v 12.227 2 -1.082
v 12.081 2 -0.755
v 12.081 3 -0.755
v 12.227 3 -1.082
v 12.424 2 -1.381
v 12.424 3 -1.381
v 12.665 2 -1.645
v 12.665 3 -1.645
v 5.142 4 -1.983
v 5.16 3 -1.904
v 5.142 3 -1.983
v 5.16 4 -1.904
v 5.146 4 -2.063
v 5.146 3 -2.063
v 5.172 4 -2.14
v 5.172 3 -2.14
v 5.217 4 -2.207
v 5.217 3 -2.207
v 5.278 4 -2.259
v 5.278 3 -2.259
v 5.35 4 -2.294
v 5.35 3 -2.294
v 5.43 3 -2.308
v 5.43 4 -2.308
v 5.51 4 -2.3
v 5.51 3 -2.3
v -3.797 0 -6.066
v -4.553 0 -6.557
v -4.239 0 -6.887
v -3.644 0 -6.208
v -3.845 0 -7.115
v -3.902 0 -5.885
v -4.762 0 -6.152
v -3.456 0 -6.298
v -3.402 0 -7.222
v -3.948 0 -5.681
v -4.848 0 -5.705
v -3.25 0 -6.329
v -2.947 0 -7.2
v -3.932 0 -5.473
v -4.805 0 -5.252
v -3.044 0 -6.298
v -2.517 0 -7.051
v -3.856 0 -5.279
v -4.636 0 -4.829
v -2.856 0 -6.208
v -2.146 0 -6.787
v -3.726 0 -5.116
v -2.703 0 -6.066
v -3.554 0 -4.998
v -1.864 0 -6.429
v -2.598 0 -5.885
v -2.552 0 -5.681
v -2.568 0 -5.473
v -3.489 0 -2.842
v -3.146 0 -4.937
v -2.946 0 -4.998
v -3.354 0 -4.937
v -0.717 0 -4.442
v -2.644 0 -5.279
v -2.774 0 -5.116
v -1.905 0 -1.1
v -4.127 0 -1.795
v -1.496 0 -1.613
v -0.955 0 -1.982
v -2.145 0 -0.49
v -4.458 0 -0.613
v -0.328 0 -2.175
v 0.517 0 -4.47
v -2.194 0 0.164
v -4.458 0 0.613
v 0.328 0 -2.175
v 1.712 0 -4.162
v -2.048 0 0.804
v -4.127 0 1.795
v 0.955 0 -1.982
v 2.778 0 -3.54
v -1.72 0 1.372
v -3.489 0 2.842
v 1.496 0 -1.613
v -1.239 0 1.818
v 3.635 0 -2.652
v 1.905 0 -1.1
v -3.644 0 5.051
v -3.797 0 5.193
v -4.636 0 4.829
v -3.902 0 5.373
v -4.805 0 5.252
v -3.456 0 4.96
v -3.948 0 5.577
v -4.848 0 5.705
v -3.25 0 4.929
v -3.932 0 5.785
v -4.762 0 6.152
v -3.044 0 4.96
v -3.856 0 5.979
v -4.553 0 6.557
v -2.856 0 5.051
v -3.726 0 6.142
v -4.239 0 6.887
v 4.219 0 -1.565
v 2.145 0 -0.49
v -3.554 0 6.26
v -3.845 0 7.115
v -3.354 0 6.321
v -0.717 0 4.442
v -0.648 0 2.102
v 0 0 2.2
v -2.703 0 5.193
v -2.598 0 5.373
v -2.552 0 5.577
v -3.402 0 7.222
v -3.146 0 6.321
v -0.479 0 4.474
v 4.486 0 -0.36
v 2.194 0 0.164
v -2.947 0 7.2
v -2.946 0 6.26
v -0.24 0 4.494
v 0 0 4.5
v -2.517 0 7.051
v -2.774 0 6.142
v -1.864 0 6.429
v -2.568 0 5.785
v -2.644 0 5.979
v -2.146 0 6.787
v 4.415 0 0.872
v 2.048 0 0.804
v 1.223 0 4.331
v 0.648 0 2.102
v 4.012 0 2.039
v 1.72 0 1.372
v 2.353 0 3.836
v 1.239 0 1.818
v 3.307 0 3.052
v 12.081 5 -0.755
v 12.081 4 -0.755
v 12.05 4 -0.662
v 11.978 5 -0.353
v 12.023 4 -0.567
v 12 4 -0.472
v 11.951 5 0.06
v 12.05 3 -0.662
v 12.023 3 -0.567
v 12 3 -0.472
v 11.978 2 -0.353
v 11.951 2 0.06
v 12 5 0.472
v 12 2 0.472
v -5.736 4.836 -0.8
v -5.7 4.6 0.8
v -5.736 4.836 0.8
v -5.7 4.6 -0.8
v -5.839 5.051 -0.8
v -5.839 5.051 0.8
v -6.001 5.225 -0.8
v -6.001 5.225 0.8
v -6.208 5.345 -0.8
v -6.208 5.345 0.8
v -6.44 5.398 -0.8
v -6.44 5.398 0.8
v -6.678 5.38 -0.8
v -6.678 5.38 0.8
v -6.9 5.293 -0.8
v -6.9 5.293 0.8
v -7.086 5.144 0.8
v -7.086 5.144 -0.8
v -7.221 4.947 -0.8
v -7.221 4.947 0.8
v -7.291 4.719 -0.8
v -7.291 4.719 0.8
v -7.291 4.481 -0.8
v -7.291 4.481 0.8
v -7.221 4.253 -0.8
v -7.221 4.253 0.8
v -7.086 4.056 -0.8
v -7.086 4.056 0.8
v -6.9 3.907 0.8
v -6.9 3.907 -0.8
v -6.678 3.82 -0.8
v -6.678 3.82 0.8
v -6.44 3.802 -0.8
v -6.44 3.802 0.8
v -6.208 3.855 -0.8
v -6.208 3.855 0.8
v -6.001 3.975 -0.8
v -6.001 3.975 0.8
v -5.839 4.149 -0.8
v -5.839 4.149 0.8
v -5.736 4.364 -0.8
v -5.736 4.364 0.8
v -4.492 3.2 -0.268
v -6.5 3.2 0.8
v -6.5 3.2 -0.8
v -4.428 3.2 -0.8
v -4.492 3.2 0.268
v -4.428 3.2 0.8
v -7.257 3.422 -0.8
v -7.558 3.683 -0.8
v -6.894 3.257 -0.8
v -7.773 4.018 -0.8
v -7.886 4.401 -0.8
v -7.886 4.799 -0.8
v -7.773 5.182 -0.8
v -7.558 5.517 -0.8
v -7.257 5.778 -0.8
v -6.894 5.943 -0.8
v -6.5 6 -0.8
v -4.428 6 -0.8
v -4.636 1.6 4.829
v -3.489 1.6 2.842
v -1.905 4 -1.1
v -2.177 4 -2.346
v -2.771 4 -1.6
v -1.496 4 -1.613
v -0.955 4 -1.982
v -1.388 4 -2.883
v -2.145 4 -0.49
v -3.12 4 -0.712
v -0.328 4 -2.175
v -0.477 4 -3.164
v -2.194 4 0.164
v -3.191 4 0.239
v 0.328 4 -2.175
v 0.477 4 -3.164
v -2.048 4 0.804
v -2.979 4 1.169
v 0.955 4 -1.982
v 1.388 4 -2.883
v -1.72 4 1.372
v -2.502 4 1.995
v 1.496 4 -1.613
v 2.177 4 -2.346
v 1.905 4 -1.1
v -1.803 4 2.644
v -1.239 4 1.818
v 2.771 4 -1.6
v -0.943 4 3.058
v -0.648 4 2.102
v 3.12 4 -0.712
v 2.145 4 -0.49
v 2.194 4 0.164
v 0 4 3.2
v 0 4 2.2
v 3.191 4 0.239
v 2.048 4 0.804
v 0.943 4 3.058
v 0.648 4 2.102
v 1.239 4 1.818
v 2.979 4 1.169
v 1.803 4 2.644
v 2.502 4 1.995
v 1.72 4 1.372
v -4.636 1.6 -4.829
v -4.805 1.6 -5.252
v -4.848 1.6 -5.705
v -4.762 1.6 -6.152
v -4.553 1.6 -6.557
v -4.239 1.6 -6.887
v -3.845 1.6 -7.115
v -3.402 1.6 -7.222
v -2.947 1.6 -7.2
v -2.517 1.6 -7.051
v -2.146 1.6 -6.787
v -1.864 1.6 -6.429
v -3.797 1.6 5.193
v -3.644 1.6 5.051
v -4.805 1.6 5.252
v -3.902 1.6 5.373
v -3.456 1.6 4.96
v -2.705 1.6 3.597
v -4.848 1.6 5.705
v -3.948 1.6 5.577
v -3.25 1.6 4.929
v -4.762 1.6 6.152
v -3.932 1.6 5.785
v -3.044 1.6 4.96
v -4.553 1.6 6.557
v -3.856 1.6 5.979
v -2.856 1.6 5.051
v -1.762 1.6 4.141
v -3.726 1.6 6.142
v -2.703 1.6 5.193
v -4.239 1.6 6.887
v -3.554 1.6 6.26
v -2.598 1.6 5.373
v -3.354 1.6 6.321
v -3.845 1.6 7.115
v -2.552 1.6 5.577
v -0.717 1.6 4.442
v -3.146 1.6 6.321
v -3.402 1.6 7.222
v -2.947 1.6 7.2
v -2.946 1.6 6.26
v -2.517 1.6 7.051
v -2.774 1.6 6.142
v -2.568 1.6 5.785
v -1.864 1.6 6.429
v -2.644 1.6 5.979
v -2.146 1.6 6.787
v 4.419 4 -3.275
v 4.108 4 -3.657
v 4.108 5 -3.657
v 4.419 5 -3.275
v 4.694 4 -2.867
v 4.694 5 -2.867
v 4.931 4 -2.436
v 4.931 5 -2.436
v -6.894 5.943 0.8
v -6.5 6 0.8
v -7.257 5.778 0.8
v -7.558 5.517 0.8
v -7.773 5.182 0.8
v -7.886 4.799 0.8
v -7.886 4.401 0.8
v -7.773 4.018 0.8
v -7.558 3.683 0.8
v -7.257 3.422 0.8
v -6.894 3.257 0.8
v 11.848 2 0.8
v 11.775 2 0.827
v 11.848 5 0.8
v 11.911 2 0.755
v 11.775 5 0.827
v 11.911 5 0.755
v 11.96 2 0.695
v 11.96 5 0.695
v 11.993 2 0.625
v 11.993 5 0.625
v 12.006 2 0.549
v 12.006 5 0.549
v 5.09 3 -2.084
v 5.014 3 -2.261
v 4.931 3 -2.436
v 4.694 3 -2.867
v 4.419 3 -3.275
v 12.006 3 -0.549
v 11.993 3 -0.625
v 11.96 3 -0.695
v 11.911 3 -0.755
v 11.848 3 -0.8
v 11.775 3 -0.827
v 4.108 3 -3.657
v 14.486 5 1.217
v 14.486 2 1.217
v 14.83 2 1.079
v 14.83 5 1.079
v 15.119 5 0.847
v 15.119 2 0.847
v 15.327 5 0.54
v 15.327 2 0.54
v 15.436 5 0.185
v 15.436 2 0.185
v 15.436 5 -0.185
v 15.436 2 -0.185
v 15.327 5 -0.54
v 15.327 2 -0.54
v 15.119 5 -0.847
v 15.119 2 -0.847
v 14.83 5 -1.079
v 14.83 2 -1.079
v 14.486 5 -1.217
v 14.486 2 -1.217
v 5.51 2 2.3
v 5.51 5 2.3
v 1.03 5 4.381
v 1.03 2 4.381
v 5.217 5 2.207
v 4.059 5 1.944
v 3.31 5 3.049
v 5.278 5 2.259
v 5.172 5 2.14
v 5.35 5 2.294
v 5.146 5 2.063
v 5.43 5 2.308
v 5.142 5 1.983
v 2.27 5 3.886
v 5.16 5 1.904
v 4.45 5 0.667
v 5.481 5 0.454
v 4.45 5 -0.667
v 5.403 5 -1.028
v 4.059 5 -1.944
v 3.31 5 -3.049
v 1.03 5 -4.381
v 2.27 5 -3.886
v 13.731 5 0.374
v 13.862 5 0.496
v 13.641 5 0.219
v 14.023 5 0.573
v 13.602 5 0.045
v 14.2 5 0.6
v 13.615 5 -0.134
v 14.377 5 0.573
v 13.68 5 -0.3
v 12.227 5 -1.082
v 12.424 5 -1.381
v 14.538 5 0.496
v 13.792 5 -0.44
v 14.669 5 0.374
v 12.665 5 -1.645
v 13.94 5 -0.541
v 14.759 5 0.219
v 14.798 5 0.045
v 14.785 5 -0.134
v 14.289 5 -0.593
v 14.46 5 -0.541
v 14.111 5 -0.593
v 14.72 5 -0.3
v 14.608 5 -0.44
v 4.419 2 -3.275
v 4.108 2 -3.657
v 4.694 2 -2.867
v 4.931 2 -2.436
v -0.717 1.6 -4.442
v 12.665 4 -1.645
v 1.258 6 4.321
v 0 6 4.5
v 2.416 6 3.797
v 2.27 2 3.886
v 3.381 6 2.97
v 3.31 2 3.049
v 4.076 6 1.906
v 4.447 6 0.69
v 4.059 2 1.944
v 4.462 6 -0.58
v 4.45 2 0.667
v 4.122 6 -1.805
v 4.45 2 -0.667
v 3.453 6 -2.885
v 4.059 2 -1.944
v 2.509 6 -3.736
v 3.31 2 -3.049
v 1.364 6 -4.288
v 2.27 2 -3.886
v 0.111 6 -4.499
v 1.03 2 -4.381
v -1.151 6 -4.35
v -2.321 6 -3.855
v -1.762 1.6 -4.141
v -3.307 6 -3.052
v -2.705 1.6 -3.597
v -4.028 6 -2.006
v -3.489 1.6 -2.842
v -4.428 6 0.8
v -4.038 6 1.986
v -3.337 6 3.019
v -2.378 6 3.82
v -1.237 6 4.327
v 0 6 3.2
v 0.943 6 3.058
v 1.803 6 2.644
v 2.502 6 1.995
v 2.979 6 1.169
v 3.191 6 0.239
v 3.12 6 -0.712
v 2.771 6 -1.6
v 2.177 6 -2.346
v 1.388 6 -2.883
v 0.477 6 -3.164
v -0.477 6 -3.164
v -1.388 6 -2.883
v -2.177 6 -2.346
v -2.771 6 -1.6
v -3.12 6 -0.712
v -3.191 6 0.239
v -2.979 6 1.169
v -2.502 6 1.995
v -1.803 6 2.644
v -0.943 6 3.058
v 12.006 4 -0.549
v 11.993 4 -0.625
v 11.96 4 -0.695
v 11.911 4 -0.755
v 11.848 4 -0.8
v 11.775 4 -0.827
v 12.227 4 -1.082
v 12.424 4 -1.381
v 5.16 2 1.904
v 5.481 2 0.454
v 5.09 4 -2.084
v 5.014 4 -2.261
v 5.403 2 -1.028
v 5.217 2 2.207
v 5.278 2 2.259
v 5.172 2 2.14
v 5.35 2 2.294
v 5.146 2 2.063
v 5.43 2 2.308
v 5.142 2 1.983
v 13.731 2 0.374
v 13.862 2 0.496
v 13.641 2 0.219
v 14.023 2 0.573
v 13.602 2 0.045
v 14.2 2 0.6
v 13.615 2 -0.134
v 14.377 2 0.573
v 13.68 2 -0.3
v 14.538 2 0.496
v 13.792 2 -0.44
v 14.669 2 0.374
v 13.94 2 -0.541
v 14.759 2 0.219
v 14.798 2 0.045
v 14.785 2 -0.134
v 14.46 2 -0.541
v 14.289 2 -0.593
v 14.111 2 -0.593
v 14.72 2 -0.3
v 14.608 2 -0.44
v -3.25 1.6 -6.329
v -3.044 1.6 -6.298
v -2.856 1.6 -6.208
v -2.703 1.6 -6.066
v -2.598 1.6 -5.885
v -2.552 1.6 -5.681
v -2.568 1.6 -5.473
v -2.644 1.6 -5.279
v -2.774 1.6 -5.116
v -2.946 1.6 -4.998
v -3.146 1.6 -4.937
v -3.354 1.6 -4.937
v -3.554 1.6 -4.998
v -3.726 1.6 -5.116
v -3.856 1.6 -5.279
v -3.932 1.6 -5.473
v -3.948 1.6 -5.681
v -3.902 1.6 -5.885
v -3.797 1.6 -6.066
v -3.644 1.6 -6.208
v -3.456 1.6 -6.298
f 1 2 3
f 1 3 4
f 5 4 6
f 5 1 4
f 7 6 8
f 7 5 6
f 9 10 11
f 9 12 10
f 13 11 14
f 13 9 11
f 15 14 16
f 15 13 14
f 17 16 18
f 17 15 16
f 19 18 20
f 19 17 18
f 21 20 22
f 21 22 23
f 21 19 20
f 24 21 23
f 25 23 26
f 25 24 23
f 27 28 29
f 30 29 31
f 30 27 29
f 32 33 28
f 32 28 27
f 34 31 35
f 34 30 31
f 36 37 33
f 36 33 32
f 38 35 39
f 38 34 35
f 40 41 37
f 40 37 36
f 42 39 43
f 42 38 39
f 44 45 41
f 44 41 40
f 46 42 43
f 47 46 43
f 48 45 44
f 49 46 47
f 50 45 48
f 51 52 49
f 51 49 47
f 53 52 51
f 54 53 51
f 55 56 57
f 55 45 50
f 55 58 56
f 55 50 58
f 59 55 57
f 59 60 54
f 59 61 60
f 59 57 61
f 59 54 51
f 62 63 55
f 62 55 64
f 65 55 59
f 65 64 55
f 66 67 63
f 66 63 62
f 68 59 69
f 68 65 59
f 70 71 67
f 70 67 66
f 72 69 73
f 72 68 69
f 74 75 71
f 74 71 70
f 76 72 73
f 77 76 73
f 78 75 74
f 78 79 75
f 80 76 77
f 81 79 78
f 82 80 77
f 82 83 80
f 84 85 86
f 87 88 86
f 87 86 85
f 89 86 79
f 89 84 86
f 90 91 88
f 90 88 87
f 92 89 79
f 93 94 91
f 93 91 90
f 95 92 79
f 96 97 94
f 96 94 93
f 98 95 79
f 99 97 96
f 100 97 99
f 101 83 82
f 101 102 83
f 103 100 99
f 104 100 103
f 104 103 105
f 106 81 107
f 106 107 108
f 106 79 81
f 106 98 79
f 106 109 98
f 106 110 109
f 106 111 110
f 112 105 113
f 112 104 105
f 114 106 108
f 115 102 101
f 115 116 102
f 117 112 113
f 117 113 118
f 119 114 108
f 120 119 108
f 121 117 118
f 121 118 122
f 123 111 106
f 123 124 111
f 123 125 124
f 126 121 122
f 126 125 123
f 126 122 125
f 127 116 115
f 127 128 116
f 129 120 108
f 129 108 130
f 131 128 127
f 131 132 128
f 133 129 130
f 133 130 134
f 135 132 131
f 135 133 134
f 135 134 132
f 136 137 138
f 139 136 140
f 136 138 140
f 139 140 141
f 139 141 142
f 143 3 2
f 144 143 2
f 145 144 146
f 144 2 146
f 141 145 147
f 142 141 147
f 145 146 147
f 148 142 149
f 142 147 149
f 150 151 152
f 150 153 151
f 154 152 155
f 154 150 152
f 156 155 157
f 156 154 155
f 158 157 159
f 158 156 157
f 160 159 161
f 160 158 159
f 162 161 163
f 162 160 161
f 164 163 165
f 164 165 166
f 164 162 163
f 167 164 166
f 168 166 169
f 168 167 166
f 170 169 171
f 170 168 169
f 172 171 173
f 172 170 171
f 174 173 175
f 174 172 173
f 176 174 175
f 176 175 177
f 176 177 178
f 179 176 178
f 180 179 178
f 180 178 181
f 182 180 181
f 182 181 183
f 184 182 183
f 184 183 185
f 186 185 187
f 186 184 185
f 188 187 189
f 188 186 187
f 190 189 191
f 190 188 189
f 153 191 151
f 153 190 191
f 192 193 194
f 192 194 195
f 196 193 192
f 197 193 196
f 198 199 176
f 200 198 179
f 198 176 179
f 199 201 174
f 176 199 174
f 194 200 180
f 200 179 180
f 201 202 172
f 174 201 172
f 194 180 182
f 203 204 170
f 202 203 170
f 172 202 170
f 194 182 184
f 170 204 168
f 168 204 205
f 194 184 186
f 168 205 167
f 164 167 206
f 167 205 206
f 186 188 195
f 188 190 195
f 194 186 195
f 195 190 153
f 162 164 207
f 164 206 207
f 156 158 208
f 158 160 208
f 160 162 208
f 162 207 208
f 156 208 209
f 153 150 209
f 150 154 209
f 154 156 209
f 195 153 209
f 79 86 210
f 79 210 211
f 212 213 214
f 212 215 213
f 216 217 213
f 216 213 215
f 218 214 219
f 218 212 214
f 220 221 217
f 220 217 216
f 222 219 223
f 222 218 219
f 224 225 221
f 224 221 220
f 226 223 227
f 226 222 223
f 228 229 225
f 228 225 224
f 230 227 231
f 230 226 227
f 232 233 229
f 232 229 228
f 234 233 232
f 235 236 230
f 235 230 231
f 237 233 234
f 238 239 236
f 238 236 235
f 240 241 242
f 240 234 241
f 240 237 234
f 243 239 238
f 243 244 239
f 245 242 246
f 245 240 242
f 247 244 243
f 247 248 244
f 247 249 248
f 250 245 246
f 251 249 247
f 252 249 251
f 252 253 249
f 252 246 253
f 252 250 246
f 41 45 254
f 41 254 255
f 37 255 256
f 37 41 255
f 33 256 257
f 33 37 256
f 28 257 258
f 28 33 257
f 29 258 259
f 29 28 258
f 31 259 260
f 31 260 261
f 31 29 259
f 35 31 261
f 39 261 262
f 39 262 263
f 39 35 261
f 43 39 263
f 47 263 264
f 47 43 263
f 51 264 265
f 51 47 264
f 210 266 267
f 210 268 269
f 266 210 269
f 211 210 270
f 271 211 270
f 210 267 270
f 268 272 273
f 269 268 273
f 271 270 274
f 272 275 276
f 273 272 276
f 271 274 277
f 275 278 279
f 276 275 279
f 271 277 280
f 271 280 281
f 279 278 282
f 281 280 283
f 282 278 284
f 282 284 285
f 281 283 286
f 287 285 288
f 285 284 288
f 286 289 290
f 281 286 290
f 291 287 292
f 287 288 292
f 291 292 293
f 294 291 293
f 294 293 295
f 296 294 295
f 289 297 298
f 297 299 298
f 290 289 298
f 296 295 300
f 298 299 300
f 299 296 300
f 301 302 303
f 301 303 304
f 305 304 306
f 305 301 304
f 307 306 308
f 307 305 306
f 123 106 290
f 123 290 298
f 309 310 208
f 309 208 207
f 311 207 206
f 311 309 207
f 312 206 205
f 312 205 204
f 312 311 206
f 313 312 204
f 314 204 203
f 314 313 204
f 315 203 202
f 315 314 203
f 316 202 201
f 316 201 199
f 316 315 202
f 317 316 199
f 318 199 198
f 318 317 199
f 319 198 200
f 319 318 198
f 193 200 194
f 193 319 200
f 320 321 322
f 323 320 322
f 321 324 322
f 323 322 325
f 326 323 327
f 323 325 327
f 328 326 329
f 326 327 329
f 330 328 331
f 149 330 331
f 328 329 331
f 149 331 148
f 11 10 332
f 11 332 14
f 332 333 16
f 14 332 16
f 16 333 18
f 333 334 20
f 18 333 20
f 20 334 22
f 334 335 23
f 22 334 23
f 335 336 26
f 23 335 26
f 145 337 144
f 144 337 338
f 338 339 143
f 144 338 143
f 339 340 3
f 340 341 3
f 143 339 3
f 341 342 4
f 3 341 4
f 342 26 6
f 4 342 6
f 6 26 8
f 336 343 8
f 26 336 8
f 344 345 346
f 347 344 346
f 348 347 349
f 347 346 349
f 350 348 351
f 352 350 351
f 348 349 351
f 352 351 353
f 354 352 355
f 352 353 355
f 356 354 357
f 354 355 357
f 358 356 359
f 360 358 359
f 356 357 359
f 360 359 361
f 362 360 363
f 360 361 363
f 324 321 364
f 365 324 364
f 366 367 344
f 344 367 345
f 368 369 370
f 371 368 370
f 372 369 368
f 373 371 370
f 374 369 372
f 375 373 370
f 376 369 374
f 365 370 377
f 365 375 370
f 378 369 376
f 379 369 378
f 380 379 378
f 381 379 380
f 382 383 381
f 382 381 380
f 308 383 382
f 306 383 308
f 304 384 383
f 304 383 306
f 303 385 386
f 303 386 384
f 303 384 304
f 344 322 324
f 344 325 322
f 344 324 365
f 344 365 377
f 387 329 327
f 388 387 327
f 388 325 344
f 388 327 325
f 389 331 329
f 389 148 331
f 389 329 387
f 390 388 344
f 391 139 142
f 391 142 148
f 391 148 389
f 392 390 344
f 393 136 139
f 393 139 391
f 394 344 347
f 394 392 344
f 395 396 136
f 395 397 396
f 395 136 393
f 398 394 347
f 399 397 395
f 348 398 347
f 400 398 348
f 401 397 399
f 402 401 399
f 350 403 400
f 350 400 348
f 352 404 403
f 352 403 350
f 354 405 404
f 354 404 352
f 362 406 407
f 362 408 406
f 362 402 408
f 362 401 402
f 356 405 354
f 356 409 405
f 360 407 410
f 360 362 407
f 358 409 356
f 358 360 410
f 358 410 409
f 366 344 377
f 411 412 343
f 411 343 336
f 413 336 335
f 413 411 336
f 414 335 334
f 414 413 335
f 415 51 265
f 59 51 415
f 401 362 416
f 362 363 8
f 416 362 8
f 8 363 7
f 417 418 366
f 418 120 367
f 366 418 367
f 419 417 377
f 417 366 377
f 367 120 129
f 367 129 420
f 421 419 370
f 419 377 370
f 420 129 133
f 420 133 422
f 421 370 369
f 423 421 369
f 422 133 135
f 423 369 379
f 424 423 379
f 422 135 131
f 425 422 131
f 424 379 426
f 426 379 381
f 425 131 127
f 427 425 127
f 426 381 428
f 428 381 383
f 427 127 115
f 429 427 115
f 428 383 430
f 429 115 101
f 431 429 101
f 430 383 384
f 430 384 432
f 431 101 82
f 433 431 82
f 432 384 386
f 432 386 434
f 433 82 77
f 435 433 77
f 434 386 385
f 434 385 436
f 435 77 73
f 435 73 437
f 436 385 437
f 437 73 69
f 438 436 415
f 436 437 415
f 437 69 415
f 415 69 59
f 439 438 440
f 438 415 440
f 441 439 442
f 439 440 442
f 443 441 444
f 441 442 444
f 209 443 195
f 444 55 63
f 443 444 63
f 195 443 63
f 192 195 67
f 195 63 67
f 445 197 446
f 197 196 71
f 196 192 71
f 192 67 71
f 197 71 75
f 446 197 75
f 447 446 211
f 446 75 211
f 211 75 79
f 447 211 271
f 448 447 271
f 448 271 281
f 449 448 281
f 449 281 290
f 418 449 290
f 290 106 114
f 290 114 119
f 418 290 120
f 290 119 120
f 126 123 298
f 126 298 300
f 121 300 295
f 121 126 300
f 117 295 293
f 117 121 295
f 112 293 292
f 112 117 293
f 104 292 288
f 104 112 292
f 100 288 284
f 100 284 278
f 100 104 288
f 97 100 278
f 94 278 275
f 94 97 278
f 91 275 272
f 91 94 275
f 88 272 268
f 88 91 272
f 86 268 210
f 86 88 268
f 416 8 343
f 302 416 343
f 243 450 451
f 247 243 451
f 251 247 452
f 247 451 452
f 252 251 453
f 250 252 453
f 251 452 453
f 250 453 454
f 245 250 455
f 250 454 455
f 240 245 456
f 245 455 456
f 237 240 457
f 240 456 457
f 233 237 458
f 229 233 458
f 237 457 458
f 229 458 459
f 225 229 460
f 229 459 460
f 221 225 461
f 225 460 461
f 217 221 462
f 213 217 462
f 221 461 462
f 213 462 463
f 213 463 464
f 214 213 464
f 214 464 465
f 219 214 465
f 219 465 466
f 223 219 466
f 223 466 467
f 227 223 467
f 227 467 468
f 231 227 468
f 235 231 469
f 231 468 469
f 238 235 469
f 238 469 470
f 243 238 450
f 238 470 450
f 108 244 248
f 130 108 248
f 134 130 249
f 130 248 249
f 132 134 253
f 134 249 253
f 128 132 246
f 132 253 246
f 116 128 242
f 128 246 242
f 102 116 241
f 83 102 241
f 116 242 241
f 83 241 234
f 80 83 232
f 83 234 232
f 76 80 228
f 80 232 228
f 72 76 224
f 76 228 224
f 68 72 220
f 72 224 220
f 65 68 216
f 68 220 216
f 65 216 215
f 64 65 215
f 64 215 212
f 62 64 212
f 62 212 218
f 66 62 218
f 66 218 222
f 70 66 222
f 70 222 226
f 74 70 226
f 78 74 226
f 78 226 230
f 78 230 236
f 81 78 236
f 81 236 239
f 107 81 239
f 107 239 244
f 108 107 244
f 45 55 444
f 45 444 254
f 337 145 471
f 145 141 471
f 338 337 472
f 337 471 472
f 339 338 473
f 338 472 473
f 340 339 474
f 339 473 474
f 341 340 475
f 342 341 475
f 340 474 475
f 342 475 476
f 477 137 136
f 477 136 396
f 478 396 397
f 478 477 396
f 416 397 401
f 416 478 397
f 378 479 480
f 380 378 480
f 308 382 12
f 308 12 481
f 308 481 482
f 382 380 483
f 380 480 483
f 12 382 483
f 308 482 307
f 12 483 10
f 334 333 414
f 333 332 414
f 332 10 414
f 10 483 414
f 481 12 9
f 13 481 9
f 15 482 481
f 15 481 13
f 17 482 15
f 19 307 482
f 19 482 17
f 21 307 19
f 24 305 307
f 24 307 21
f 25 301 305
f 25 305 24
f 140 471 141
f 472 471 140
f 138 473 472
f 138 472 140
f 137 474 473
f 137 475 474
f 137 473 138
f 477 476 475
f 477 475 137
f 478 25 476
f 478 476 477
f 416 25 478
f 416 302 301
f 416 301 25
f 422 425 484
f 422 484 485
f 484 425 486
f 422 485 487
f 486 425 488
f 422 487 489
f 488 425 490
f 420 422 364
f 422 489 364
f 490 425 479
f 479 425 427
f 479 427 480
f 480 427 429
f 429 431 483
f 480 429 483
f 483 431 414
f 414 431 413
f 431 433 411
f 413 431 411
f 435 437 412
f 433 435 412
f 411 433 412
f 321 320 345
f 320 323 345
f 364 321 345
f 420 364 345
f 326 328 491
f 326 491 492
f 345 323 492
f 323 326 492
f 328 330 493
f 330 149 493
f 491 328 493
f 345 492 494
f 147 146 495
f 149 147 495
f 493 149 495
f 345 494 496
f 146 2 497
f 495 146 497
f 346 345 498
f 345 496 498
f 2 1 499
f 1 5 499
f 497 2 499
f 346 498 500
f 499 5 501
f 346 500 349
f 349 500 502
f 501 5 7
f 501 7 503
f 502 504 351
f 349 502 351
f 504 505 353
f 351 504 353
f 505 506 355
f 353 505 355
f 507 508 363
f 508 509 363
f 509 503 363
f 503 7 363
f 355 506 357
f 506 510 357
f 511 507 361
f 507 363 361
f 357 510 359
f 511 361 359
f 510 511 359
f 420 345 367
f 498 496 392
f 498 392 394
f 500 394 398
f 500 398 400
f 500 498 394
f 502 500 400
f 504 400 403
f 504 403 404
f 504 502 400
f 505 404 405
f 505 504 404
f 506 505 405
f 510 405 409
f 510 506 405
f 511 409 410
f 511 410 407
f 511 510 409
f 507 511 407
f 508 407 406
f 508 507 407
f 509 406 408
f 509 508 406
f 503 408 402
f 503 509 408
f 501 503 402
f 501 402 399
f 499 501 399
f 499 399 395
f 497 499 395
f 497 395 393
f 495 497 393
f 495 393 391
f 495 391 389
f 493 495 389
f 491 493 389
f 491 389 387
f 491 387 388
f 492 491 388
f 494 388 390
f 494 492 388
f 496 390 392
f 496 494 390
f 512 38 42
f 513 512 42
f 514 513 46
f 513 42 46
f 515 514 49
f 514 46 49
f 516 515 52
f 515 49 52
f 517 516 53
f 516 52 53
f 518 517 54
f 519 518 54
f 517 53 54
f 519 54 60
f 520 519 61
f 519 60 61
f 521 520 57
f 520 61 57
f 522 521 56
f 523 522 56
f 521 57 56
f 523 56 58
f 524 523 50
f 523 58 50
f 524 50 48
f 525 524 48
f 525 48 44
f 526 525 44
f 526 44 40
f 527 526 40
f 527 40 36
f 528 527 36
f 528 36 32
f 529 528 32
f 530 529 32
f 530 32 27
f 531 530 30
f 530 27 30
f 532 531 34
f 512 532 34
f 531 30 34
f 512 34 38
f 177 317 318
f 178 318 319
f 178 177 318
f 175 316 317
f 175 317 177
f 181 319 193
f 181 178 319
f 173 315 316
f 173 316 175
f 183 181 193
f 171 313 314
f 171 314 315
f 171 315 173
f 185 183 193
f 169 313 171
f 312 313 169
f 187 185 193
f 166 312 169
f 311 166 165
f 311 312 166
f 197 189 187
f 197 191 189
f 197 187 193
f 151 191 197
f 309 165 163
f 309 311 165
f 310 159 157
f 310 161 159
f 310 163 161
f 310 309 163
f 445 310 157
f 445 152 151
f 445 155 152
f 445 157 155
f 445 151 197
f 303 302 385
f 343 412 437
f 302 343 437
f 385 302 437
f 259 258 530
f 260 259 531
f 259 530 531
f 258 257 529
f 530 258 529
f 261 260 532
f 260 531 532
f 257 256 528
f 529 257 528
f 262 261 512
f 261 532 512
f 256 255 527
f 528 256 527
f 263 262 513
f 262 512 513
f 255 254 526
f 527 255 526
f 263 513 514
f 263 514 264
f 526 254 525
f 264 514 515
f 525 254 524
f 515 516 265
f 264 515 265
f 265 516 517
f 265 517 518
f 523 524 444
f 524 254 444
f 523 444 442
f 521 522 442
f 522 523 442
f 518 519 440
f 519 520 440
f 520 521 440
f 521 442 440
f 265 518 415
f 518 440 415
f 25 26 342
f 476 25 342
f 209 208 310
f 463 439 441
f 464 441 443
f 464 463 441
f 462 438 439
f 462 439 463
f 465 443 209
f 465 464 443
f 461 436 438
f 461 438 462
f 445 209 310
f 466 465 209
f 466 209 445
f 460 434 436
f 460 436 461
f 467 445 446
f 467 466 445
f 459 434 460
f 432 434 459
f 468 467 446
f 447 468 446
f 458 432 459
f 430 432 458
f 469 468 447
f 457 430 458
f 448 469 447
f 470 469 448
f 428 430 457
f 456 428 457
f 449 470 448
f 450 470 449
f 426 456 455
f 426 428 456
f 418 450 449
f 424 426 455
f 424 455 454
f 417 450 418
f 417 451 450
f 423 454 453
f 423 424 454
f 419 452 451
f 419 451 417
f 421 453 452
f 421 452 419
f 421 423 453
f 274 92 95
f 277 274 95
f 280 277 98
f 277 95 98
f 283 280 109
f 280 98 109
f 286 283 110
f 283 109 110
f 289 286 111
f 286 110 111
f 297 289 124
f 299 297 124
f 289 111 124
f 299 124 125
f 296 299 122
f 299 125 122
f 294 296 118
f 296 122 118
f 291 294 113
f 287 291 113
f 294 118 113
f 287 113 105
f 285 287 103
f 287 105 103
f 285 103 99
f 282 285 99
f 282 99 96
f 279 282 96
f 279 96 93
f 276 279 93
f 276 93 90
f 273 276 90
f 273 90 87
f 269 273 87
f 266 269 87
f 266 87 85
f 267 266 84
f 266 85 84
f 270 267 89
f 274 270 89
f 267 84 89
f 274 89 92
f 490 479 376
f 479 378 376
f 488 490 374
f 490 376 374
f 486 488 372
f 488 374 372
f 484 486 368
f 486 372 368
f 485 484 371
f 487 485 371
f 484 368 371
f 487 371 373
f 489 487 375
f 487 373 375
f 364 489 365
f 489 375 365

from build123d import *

# Parameters (mm, degrees)
SKETCH1_R           = 4.5
BOSS_EXTRUDE1_DEPTH = 6
SKETCH3_R           = 0.7
BOSS_EXTRUDE2_DEPTH = 1.6
SKETCH4_R           = 0.8
BOSS_EXTRUDE3_DEPTH = 0.8
BOSS_EXTRUDE4_START = -4
SKETCH5_R           = 0.6
BOSS_EXTRUDE4_DEPTH = 3
CUT_EXTRUDE1_START  = -2
CUT_EXTRUDE1_DEPTH  = 1
CUT_EXTRUDE2_START  = -4
CUT_EXTRUDE2_DEPTH  = 1
FILLET1_R           = 0.3
SKETCH6_R           = 3.2
SKETCH6_R_2         = 2.2
CUT_EXTRUDE4_DEPTH  = 2
SKETCH6_4_R         = 2.2
CUT_EXTRUDE5_DEPTH  = 19.08212732


with BuildPart() as part:
    # Sketch1 → Boss-Extrude1 (new body)
    with BuildSketch(Plane(origin=(0, 0, 0), x_dir=(1, 0, 0), z_dir=(0, 1, 0))):
        Circle(SKETCH1_R)
    extrude(amount=BOSS_EXTRUDE1_DEPTH)

    # Sketch3 → Boss-Extrude2 (add)
    # profile 1 of 2: a face of its own
    with BuildSketch(Plane.XZ):
        with BuildLine():
            Line((-0.717333438, 4.442457961), (-1.864359354, 6.429165125))
            ThreePointArc((-1.864359354, 6.429165125), (-4.05, 7.014805771), (-4.635640646, 4.829165125))
            Line((-4.635640646, 4.829165125), (-3.488614731, 2.842457961))
            ThreePointArc((-3.488614731, 2.842457961), (-2.25, 3.897114317), (-0.717333438, 4.442457961))
        make_face()
        with Locations((-3.25, 5.629165125)):
            Circle(SKETCH3_R, mode=Mode.SUBTRACT)
    # profile 2 of 2: a face of its own
    with BuildSketch(Plane.XZ):
        with BuildLine():
            ThreePointArc((-0.717333438, -4.442457961), (-2.25, -3.897114317), (-3.488614731, -2.842457961))
            Line((-3.488614731, -2.842457961), (-4.635640646, -4.829165125))
            ThreePointArc((-4.635640646, -4.829165125), (-4.05, -7.014805771), (-1.864359354, -6.429165125))
            Line((-1.864359354, -6.429165125), (-0.717333438, -4.442457961))
        make_face()
        with Locations((-3.25, -5.629165125)):
            Circle(SKETCH3_R, mode=Mode.SUBTRACT)
    extrude(amount=-BOSS_EXTRUDE2_DEPTH)

    # Sketch4 → Boss-Extrude3 (add, symmetric)
    with BuildSketch(Plane.XY):
        with BuildLine():
            Line((-3.5, 6), (-6.5, 6))
            ThreePointArc((-6.5, 6), (-7.9, 4.6), (-6.5, 3.2))
            Line((-6.5, 3.2), (-3.5, 3.2))
            Line((-3.5, 3.2), (-3.5, 6))
        make_face()
        with Locations((-6.5, 4.6)):
            Circle(SKETCH4_R, mode=Mode.SUBTRACT)
    extrude(amount=BOSS_EXTRUDE3_DEPTH, both=True)

    # Sketch5 → Boss-Extrude4 (add)
    with BuildSketch(Plane(origin=(0, 6, 0), x_dir=(1, 0, 0), z_dir=(0, 1, 0)).offset(BOSS_EXTRUDE4_START)):
        with BuildLine():
            ThreePointArc((1.029929577, 4.380553055), (4.5, 0), (1.029929577, -4.380553055))
            Line((1.029929577, -4.380553055), (14.486091549, -1.216820293))
            ThreePointArc((14.486091549, -1.216820293), (15.45, 0), (14.486091549, 1.216820293))
            Line((14.486091549, 1.216820293), (1.029929577, 4.380553055))
        make_face()
        with BuildLine():
            ThreePointArc((4.931081365, -2.436069903), (5.5, 0), (4.931081365, 2.436069903))
            Line((4.931081365, 2.436069903), (12.080503997, 0.75514018))
            ThreePointArc((12.080503997, 0.75514018), (11.95, 0), (12.080503997, -0.75514018))
            Line((12.080503997, -0.75514018), (4.931081365, -2.436069903))
        make_face(mode=Mode.SUBTRACT)
        with Locations((14.2, 0)):
            Circle(SKETCH5_R, mode=Mode.SUBTRACT)
    extrude(amount=BOSS_EXTRUDE4_DEPTH)

    # Sketch5<3> → Cut-Extrude1 (cut)
    with BuildSketch(Plane(origin=(0, 6, 0), x_dir=(1, 0, 0), z_dir=(0, 1, 0)).offset(CUT_EXTRUDE1_START)):
        with BuildLine():
            Line((12.664921694, 1.645002916), (4.108268481, 3.656792323))
            ThreePointArc((4.108268481, 3.656792323), (4.560701943, 3.074084869), (4.931081365, 2.436069903))
            Line((4.931081365, 2.436069903), (12.080503997, 0.75514018))
            ThreePointArc((12.080503997, 0.75514018), (12.319323987, 1.235134702), (12.664921694, 1.645002916))
        make_face()
    extrude(amount=CUT_EXTRUDE1_DEPTH, mode=Mode.SUBTRACT)

    # Sketch5<4> → Cut-Extrude2 (cut)
    with BuildSketch(Plane(origin=(0, 6, 0), x_dir=(1, 0, 0), z_dir=(0, 1, 0)).offset(CUT_EXTRUDE2_START)):
        with BuildLine():
            Line((12.664921694, 1.645002916), (4.108268481, 3.656792323))
            ThreePointArc((4.108268481, 3.656792323), (4.560701943, 3.074084869), (4.931081365, 2.436069903))
            Line((4.931081365, 2.436069903), (12.080503997, 0.75514018))
            ThreePointArc((12.080503997, 0.75514018), (12.319323987, 1.235134702), (12.664921694, 1.645002916))
        make_face()
    extrude(amount=CUT_EXTRUDE2_DEPTH, mode=Mode.SUBTRACT)

    # Fillet1
    fillet1_edges = [part.edges().sort_by_distance(p)[0] for p in [
        (4.931081365, 3.5, -2.436069903),
        (12.080503997, 3.5, -0.75514018),
        (12.080503997, 3.5, 0.75514018),
        (4.931081365, 3.5, 2.436069903),
    ]]
    fillet(fillet1_edges, radius=FILLET1_R)

    # Sketch6 → Cut-Extrude4 (cut)
    with BuildSketch(Plane(origin=(0, 6, 0), x_dir=(1, 0, 0), z_dir=(0, 1, 0))):
        Circle(SKETCH6_R)
        Circle(SKETCH6_R_2, mode=Mode.SUBTRACT)
    extrude(amount=-CUT_EXTRUDE4_DEPTH, mode=Mode.SUBTRACT)

    # Sketch6<4> → Cut-Extrude5 (cut, through all)
    with BuildSketch(Plane(origin=(0, 6, 0), x_dir=(1, 0, 0), z_dir=(0, 1, 0))):
        Circle(SKETCH6_4_R)
    extrude(amount=-CUT_EXTRUDE5_DEPTH, mode=Mode.SUBTRACT)


solid = part.part
